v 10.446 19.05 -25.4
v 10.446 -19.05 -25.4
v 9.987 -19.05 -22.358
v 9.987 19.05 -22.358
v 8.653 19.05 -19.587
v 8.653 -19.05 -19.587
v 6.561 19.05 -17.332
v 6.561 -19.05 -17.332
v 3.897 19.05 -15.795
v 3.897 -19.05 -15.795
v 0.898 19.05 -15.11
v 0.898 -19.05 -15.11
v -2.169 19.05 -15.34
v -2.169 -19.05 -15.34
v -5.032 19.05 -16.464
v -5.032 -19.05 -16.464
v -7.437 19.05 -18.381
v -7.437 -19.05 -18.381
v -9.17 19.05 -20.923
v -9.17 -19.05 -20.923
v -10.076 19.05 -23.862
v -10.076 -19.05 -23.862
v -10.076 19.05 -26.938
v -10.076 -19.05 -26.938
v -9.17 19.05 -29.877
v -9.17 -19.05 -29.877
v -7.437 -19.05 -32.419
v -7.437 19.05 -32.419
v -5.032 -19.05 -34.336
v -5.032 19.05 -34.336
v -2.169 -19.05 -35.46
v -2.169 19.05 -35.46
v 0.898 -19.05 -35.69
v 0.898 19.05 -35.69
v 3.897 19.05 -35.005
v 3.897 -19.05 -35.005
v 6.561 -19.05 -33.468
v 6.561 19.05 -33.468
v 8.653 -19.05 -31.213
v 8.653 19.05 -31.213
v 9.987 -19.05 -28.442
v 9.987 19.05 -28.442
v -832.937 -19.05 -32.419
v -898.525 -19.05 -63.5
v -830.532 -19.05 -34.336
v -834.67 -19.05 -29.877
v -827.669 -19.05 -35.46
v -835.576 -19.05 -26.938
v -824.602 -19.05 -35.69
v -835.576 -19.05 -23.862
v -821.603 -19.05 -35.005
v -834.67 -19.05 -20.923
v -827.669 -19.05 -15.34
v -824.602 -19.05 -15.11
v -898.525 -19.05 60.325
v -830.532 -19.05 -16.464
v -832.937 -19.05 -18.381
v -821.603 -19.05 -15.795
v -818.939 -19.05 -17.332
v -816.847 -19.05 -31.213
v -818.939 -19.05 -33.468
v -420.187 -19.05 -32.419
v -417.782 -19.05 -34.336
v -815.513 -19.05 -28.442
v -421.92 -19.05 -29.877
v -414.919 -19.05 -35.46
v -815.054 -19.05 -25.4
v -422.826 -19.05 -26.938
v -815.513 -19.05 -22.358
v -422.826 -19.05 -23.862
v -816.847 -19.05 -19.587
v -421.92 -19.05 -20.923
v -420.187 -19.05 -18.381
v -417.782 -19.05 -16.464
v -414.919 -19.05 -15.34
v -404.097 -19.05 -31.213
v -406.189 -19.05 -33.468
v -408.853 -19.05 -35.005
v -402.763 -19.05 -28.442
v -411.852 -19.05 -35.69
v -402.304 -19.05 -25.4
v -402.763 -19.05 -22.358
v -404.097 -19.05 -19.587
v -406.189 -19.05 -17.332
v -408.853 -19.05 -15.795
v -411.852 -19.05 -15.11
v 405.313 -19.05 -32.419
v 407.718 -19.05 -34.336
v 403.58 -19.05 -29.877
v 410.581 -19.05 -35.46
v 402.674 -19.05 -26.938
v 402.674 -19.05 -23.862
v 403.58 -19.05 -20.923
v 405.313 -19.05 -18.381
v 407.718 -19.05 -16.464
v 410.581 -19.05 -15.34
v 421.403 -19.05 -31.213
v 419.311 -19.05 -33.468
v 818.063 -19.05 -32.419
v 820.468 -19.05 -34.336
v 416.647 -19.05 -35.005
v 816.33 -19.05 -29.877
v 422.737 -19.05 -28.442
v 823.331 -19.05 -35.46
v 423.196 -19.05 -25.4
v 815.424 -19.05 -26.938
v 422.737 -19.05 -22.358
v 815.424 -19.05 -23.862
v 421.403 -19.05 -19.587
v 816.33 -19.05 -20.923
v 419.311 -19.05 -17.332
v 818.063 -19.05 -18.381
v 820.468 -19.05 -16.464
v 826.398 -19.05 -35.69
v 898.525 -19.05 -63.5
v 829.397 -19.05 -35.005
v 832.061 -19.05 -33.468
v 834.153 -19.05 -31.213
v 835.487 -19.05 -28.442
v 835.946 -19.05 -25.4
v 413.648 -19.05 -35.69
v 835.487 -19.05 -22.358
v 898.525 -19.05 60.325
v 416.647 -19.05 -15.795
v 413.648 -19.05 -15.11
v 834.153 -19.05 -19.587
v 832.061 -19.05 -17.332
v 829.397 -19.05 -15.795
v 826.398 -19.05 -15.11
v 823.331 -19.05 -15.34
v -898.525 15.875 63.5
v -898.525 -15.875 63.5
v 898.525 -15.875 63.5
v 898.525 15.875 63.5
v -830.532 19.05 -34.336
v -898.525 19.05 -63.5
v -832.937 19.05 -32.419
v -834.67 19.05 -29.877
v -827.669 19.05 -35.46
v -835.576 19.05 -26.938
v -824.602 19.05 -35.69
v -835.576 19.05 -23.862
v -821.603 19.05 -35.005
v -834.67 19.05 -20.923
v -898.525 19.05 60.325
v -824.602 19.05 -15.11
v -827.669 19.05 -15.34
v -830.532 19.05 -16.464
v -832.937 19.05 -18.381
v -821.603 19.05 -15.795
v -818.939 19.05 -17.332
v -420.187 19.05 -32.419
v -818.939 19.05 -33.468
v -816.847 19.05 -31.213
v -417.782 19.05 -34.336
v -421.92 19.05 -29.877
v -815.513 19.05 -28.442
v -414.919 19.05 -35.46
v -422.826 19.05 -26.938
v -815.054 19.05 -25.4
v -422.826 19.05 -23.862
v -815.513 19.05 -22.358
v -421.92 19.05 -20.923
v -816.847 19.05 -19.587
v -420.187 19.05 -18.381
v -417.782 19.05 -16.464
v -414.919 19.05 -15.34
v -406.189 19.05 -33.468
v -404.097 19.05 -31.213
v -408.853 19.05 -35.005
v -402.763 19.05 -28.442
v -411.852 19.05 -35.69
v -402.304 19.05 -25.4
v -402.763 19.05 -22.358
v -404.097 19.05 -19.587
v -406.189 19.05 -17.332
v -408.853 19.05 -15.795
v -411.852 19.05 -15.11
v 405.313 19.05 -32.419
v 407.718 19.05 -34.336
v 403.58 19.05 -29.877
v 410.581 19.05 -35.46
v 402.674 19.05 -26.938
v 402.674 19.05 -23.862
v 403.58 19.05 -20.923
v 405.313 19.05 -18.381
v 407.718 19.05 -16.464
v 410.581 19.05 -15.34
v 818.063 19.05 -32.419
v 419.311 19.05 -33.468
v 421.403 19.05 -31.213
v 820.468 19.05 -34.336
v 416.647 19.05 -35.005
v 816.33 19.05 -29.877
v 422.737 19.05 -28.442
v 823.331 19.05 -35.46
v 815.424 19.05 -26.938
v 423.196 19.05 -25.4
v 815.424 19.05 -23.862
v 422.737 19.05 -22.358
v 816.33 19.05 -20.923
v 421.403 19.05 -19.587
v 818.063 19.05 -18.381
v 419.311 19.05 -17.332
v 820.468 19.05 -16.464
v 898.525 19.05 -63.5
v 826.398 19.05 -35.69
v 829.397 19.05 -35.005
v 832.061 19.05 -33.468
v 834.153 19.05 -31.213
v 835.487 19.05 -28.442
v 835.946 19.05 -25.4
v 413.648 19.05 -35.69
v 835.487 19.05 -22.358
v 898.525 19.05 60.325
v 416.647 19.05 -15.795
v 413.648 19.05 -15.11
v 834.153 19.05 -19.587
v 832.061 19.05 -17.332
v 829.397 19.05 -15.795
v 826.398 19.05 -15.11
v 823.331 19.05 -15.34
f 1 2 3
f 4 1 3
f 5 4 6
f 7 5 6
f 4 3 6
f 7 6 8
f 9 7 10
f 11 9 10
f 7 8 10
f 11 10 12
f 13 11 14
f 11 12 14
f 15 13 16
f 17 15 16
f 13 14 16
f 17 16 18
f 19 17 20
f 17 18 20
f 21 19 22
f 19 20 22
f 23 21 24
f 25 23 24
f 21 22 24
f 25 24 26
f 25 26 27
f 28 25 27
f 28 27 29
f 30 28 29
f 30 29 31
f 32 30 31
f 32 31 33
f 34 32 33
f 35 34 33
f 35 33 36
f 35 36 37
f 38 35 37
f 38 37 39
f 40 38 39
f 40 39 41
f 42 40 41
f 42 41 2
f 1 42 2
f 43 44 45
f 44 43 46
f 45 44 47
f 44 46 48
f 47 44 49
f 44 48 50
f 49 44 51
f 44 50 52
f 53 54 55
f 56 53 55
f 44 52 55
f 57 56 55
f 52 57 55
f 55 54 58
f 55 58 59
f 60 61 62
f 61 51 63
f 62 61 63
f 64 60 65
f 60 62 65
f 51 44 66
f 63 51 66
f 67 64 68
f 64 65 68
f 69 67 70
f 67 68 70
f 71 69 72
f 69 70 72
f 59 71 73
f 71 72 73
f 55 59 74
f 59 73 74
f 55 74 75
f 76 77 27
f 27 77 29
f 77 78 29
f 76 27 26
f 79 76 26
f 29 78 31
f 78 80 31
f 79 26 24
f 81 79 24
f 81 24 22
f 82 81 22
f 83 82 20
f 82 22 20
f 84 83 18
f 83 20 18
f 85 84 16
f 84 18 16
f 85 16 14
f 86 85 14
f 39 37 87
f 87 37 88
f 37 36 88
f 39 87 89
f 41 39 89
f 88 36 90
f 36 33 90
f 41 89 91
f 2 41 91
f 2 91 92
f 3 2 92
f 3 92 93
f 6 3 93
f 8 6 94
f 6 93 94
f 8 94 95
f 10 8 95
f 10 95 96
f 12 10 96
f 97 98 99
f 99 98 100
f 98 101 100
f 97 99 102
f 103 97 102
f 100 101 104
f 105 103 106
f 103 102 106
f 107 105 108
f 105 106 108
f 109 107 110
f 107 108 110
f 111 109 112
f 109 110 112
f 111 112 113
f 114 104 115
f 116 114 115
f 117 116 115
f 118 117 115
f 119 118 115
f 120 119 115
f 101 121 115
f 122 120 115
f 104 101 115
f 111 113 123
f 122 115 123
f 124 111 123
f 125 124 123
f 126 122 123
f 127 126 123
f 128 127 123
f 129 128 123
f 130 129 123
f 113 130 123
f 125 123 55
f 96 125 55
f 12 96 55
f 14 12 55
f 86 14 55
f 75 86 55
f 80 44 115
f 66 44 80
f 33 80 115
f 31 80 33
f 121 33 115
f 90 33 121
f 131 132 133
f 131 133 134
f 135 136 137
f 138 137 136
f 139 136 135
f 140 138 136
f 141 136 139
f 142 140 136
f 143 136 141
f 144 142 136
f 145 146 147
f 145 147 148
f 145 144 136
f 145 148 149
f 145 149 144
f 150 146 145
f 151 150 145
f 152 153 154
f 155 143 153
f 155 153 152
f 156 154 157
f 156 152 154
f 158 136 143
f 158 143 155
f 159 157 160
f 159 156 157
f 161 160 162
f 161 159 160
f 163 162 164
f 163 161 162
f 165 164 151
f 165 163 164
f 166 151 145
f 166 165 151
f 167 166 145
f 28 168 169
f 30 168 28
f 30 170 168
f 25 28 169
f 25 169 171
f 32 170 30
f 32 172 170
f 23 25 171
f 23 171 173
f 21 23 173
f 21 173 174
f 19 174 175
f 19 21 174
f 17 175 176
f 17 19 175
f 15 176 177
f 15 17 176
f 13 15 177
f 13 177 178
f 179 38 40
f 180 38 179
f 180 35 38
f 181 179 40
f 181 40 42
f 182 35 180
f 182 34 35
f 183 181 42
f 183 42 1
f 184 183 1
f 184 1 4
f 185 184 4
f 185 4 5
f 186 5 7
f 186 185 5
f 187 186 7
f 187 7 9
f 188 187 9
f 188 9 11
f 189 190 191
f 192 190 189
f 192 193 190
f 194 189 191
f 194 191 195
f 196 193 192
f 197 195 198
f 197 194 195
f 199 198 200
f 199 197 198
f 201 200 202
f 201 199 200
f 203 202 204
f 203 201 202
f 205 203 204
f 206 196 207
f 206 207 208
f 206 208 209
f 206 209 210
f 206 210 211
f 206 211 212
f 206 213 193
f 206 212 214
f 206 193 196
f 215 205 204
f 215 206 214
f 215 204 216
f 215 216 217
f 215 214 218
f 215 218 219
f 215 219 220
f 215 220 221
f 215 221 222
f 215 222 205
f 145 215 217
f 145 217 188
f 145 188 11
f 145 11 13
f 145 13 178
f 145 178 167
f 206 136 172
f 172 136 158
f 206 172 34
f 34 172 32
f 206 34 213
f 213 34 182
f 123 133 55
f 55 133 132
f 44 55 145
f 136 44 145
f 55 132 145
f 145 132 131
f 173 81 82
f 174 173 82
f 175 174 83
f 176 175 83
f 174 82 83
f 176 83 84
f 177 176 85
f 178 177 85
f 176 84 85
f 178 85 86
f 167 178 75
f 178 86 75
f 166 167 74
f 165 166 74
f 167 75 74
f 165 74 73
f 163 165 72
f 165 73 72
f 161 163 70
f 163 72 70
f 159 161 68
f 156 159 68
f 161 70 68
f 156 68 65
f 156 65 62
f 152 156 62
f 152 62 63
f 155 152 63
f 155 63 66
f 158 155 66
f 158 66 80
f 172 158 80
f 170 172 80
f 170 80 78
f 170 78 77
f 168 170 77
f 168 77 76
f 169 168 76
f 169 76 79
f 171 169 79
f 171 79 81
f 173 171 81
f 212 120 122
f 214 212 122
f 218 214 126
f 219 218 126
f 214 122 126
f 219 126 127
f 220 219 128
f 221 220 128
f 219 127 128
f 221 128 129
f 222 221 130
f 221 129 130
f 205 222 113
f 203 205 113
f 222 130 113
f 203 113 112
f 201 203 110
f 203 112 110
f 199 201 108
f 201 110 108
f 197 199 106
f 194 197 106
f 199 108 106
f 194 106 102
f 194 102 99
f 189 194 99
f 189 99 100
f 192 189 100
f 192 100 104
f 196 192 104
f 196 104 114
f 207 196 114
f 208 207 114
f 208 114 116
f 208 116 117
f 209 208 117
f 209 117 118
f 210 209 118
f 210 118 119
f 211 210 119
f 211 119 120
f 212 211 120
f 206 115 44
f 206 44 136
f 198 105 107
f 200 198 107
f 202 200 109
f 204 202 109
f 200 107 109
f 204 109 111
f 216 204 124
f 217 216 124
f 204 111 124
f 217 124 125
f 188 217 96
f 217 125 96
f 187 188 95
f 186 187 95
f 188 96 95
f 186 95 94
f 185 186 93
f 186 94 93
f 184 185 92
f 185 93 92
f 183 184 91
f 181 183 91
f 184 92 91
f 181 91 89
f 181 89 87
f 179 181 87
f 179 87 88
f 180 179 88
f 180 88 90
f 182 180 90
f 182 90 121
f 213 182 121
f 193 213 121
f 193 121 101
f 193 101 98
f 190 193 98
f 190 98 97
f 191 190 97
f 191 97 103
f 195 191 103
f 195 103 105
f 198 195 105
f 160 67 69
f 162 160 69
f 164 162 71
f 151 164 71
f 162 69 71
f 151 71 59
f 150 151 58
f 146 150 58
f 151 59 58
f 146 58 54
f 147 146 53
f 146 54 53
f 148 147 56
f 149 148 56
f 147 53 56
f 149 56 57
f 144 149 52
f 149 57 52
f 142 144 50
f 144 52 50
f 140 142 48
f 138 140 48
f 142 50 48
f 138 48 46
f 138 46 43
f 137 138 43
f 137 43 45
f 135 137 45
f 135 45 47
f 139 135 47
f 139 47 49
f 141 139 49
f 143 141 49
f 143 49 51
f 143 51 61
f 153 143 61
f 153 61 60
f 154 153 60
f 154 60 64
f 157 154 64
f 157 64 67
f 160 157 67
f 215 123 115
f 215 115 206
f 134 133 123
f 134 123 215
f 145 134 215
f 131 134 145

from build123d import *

# Parameters (mm, degrees)
F0_W     = 38.1
F0_H     = 127
F1_DEPTH = 898.525
F2_SIZE  = 3.175
F4_D     = 20.6375


# Not quite as in the source:
# - a length typed as a fraction of an inch, garbled in the dataset ("3 / 203.2 mm" for 3/8 in), is restored


with BuildPart() as f1:
    # F0 (on Right) → F1 (new body, symmetric)
    with BuildSketch(Plane.YZ):
        Rectangle(F0_W, F0_H)
    extrude(amount=F1_DEPTH, both=True)

    # F2
    f2_edges = [f1.edges().sort_by_distance(p)[0] for p in [
        (0, 19.05, 63.5),
        (0, -19.05, 63.5),
    ]]
    chamfer(f2_edges, length=F2_SIZE)

    # F4 (through all)
    with Locations(Plane(origin=(0, 19.05, 0), x_dir=(-1, 0, 0), z_dir=(0, 1, 0))):
        with Locations((-825.627, -25.4), (-412.877, -25.4), (-0.127, -25.4), (412.623, -25.4), (825.373, -25.4)):
            Hole(F4_D / 2)


solid = f1.part
